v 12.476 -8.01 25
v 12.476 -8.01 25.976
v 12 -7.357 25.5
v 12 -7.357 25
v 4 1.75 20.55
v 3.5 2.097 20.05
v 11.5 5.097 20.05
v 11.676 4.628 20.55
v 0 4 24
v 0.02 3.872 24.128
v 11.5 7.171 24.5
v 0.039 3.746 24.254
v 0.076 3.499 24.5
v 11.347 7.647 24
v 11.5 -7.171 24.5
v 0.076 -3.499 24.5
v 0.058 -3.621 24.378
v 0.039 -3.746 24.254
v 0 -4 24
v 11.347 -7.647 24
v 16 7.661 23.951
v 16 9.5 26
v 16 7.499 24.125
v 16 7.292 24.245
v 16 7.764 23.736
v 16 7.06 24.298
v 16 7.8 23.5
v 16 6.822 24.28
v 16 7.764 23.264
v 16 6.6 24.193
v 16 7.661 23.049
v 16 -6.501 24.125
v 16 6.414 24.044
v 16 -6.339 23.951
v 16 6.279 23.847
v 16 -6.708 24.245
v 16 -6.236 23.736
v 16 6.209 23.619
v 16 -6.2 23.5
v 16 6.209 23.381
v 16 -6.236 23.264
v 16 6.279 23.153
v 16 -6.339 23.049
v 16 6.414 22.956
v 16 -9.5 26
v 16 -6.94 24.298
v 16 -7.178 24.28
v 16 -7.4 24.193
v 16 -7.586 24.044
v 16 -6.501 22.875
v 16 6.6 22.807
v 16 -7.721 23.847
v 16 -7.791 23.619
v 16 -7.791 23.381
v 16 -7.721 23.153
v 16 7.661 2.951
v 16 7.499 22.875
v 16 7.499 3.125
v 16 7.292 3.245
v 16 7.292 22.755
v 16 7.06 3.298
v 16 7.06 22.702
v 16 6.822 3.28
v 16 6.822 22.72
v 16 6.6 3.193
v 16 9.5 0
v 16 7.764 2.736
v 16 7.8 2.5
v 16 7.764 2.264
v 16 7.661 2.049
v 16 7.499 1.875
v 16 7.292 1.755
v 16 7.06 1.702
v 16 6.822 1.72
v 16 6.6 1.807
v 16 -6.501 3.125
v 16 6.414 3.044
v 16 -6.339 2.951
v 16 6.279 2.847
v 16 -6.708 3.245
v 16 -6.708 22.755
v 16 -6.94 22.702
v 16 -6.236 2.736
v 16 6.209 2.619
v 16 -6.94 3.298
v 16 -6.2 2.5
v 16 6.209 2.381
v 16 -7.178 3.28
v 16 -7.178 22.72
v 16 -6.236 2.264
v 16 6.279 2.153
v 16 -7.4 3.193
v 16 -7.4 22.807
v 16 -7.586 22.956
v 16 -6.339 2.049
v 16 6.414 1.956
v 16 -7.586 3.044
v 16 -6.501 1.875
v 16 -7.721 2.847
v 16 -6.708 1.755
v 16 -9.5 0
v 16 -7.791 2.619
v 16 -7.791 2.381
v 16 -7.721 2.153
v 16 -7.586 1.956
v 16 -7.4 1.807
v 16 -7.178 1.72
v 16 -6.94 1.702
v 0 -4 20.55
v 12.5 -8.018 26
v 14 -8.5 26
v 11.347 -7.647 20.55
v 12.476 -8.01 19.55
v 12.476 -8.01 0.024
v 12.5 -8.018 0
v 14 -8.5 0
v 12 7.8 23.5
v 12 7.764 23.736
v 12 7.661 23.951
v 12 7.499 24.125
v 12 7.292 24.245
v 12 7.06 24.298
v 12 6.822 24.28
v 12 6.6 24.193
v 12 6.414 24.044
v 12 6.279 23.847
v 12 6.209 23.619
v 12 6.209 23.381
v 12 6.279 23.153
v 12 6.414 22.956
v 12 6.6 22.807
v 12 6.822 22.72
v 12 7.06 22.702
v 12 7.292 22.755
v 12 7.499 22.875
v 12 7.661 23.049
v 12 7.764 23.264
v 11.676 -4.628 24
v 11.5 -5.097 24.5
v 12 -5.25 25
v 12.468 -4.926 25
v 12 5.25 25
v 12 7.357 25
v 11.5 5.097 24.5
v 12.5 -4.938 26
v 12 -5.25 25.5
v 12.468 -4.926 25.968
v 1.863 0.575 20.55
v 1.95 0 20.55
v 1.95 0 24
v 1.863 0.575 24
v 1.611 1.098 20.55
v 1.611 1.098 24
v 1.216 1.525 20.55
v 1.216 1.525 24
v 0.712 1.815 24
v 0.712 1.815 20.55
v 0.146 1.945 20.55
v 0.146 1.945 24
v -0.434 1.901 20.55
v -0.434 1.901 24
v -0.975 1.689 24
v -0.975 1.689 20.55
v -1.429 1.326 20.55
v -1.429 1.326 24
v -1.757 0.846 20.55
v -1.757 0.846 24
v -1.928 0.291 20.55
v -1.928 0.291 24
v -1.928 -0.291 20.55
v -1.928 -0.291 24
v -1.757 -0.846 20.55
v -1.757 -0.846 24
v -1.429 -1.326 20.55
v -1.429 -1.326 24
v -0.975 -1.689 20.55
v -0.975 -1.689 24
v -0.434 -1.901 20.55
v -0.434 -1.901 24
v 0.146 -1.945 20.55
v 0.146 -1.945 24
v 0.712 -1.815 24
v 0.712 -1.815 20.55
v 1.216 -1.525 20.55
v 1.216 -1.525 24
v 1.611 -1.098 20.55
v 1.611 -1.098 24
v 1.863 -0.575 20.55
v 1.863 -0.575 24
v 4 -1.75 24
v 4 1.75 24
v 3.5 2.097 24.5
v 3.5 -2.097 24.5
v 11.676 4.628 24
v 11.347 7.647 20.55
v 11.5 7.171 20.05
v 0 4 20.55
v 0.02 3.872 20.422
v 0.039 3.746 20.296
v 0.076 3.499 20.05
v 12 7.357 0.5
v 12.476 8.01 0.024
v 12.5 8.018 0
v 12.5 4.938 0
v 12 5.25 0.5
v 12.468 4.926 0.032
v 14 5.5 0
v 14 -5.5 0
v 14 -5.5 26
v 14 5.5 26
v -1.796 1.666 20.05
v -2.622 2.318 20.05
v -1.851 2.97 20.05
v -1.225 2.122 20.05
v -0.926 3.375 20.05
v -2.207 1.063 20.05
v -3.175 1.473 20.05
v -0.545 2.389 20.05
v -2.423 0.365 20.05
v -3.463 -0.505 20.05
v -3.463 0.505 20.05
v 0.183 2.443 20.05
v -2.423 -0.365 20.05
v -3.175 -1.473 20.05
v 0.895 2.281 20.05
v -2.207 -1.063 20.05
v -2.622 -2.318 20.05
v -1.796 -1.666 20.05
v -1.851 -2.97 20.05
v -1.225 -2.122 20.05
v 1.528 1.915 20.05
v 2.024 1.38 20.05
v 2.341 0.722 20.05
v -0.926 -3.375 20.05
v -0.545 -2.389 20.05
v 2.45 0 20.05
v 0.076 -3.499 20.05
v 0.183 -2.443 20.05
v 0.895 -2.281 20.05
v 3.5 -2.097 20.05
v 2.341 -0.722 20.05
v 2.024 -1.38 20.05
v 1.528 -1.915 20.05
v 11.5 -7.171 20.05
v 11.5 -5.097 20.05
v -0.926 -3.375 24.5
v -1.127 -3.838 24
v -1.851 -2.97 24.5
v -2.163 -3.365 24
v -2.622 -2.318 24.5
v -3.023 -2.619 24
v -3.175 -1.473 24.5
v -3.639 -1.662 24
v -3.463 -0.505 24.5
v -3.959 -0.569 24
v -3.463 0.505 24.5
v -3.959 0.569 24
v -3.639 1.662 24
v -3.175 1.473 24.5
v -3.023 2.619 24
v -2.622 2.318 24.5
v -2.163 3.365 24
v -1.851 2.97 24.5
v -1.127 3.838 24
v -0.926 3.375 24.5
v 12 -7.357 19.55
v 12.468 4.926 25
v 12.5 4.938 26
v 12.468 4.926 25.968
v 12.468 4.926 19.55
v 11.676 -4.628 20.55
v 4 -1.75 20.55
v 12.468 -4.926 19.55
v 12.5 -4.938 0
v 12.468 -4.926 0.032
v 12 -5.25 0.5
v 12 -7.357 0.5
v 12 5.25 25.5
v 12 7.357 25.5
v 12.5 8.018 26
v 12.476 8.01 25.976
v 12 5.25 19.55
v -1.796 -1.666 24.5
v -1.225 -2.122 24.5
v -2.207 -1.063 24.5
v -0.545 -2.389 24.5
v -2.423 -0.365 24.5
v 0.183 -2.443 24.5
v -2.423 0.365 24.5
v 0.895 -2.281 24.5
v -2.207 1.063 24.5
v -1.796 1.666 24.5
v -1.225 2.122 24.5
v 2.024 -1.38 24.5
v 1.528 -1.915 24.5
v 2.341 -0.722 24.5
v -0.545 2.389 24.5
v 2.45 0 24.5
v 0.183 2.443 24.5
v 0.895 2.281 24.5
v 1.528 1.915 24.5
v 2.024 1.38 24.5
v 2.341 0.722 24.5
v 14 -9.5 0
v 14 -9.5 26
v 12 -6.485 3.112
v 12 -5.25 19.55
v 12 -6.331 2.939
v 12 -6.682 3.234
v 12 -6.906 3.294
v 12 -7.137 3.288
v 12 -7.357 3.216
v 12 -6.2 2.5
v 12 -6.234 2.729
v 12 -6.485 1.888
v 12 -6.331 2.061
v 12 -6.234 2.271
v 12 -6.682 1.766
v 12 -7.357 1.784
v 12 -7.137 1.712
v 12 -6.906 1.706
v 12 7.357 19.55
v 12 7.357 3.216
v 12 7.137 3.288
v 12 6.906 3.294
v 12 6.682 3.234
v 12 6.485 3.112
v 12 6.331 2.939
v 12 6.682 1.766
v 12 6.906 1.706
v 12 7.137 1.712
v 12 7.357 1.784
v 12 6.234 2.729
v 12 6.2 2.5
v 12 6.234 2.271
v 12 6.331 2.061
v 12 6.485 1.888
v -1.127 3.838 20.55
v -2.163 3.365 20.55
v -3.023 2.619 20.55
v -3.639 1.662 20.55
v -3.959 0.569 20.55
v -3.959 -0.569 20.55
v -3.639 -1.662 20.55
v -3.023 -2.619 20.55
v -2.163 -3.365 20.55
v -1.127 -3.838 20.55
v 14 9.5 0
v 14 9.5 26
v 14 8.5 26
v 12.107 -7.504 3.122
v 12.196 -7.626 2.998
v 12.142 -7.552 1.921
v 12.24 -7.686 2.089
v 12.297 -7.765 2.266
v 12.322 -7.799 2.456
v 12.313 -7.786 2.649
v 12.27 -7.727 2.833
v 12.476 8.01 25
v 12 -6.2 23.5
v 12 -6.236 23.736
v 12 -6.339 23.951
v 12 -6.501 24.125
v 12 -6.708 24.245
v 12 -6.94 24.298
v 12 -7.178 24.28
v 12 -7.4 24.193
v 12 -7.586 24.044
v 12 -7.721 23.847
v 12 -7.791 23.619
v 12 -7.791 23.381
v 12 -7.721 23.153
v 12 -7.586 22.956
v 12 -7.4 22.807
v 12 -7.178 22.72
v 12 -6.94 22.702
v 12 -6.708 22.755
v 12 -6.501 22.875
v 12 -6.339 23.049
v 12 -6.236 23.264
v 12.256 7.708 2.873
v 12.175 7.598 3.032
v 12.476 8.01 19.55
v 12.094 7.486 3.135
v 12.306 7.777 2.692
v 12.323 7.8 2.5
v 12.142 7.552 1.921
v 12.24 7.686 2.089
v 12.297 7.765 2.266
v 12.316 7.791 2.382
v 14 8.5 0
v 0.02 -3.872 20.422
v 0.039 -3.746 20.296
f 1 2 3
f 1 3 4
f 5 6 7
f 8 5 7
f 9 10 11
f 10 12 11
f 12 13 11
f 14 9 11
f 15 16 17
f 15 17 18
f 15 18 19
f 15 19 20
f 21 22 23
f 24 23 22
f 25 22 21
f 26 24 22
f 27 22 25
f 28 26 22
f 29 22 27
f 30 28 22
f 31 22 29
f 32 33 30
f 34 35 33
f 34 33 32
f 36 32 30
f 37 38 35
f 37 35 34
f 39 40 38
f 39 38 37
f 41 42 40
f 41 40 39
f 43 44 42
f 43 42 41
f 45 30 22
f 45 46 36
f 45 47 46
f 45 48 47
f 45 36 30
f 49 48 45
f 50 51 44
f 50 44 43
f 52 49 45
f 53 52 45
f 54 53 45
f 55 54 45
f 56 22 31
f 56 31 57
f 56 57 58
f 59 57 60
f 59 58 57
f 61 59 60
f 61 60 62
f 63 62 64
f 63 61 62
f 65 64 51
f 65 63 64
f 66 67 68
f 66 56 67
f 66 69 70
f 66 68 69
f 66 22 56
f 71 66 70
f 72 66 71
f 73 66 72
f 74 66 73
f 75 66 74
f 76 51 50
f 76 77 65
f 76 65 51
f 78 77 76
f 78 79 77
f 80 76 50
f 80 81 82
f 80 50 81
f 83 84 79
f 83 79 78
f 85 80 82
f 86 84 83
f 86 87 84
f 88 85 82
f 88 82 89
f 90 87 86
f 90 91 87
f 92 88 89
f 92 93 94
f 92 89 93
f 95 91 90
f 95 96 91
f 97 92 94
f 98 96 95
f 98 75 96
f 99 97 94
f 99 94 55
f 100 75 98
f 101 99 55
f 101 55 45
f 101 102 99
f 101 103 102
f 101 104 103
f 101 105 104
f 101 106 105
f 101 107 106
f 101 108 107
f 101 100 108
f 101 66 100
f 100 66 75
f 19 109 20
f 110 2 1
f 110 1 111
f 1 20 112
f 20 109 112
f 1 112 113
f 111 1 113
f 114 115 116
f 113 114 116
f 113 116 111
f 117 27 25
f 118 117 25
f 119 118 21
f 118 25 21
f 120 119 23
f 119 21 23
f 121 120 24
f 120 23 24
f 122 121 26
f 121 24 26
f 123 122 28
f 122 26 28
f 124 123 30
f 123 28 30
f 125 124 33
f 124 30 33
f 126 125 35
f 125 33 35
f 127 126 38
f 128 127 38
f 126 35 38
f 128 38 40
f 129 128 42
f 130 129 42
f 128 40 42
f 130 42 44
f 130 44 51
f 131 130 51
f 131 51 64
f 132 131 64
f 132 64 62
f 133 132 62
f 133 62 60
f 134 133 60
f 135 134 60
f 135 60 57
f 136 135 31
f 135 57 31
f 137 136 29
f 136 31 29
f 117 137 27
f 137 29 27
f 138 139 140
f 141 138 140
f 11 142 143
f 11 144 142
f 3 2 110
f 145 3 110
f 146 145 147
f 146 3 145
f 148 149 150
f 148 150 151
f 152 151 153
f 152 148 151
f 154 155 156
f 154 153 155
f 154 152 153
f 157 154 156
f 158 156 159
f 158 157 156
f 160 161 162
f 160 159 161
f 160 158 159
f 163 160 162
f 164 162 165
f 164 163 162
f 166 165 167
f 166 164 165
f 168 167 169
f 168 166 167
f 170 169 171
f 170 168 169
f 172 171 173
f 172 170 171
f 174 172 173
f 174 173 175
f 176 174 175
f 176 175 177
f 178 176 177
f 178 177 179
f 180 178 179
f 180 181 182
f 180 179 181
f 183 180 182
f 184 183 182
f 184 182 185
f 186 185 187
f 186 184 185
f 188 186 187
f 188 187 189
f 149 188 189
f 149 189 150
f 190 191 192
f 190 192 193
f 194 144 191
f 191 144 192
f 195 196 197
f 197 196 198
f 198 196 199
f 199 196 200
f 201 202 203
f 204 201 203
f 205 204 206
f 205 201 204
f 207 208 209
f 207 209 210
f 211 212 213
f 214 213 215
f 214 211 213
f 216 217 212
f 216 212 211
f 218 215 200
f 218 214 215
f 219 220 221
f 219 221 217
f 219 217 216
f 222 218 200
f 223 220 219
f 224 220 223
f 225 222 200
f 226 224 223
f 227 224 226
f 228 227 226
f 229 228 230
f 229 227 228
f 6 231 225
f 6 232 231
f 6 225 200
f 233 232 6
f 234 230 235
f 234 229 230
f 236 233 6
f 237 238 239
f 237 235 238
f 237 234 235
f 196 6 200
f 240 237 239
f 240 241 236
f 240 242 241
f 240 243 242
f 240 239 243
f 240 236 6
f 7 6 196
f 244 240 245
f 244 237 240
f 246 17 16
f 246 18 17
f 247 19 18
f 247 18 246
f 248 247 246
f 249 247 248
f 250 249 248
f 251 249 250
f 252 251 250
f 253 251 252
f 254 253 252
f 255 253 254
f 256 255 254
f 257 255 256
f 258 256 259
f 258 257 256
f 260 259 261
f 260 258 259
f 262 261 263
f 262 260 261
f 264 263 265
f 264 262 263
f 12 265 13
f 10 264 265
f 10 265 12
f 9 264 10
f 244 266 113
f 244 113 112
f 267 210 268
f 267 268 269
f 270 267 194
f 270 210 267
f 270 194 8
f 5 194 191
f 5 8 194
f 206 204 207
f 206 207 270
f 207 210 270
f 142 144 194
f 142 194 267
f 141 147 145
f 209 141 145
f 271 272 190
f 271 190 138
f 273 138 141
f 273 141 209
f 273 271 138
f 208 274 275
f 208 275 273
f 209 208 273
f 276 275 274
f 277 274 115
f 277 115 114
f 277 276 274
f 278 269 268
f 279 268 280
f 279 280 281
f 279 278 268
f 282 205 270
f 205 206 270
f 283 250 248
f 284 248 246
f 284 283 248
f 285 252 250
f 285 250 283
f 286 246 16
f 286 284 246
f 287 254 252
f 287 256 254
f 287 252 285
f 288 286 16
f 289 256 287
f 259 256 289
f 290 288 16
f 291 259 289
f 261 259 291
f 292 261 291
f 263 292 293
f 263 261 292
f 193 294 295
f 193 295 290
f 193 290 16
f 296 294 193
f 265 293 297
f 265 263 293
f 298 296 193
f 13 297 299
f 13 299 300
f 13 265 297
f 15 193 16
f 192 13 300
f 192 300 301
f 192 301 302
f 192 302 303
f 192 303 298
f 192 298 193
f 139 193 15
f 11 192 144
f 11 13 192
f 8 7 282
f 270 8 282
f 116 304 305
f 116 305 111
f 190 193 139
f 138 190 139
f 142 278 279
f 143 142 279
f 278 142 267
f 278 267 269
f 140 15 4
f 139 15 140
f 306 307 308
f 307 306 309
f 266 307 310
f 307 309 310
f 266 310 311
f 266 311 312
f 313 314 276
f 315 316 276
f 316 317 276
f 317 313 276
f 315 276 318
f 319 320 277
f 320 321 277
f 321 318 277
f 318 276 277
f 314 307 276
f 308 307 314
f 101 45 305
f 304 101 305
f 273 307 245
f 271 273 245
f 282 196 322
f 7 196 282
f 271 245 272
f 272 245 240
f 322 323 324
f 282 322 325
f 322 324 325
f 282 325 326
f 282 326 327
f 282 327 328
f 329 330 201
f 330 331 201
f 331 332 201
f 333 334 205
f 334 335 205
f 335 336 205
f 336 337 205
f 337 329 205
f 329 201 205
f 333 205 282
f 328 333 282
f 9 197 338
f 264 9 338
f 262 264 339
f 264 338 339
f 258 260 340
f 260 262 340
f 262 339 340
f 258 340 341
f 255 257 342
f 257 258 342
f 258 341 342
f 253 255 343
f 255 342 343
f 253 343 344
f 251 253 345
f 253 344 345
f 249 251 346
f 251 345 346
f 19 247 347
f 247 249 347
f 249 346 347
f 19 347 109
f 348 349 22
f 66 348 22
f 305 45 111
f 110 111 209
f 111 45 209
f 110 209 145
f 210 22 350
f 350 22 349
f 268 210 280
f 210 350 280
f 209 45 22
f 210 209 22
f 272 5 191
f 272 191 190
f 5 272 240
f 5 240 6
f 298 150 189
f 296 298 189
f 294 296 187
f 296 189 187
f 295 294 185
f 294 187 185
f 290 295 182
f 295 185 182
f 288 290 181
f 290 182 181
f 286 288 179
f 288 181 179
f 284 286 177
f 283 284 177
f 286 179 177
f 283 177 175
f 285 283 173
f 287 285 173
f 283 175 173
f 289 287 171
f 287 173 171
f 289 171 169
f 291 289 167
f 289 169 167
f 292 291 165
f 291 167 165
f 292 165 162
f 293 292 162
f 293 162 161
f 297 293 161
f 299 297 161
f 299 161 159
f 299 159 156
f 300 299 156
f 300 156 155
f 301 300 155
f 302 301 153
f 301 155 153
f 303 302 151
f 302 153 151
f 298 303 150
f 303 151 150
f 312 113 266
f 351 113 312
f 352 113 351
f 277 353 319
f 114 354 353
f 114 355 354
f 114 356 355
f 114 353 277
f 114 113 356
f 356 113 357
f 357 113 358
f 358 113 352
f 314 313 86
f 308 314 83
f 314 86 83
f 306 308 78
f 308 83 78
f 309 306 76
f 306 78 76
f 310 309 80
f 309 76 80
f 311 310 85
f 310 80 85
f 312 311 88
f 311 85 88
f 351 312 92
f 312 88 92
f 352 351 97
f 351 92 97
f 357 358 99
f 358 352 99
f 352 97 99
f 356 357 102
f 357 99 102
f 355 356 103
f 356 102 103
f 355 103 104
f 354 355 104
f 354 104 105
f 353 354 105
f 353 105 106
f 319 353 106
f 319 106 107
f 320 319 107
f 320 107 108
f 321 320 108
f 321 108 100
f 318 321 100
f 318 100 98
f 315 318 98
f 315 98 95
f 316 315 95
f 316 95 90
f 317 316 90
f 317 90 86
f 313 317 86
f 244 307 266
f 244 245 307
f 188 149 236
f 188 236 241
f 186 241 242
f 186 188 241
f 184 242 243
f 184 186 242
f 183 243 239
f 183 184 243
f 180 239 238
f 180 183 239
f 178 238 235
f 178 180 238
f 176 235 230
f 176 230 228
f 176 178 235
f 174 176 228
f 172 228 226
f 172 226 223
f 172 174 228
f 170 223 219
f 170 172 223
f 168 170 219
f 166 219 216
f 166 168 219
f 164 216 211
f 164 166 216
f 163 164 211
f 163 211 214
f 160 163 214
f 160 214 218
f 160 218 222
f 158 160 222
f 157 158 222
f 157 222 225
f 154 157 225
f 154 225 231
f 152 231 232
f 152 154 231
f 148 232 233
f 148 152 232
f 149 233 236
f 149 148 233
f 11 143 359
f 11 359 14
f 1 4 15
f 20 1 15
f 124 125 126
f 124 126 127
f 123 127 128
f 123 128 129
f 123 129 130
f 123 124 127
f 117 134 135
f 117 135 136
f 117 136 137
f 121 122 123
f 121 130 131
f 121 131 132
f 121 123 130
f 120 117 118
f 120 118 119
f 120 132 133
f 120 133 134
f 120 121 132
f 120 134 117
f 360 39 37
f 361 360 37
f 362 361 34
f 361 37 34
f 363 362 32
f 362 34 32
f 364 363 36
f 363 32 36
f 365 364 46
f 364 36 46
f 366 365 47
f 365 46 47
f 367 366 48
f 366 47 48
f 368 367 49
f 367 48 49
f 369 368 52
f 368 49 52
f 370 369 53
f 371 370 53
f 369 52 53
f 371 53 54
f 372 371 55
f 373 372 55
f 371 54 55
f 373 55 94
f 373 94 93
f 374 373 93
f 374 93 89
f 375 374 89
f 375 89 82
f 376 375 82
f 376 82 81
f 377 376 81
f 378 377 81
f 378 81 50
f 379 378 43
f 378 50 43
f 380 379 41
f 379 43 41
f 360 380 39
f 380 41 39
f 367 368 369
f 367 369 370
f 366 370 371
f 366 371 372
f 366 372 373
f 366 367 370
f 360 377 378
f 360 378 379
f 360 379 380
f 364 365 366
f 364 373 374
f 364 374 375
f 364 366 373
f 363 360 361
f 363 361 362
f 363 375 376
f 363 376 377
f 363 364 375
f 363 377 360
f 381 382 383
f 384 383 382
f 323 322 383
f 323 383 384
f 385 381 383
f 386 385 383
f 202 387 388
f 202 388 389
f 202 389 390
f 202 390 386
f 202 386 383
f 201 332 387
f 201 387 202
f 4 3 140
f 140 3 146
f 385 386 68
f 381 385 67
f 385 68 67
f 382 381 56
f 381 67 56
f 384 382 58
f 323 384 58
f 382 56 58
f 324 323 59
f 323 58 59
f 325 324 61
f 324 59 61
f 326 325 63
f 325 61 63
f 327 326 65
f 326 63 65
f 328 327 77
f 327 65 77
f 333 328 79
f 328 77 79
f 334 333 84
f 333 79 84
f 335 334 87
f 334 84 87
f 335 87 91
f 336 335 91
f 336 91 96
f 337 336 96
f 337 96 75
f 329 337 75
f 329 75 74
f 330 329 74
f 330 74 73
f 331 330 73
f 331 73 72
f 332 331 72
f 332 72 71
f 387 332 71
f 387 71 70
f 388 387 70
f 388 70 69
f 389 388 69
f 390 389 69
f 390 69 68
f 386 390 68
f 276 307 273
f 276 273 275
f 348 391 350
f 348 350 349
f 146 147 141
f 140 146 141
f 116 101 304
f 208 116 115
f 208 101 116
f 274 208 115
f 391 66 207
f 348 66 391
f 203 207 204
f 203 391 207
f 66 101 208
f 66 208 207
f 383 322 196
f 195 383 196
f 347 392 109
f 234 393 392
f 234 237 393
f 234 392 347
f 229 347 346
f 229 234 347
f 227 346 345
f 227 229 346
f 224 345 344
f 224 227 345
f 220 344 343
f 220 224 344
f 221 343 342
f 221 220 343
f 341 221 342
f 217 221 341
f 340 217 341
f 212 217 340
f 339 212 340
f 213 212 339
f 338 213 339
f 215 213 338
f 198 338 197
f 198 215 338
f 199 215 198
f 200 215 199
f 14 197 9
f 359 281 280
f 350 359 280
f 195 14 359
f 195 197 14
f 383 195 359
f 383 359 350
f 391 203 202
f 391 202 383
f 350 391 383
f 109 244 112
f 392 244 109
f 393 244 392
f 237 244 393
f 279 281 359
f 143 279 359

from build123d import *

# Parameters (mm, degrees)
SKETCH_R        = 1.95
PAD_DEPTH       = 26
SKETCH002_W     = 18
SKETCH002_H     = 22
POCKET_DEPTH    = 20.05
SKETCH003_W     = 18.7
SKETCH003_H     = 19.57
POCKET001_DEPTH = 1.5
CHAMFER_SIZE    = 0.5
SKETCH004_R     = 0.8
POCKET002_DEPTH = 4


with BuildPart() as part:
    # Sketch → Pad (new body)
    with BuildSketch(Plane.XY):
        with BuildLine():
            Line((14, 9.5), (16, 9.5))
            Line((16, 9.5), (16, -9.5))
            Line((16, -9.5), (14, -9.5))
            Line((14, -9.5), (14, -8.5))
            Line((0, -4), (14, -8.5))
            ThreePointArc((0, 4), (-4, 0), (0, -4))
            Line((0, 4), (14, 8.5))
            Line((14, 8.5), (14, 9.5))
        make_face()
        Circle(SKETCH_R, mode=Mode.SUBTRACT)
        Polygon((4, 1.75), (4, -1.75), (14, -5.5), (14, 5.5), align=None, mode=Mode.SUBTRACT)
    extrude(amount=PAD_DEPTH)

    # Sketch002 (on Face14 of Pad) → Pocket (cut)
    with BuildSketch(Plane(origin=(0, 0, 0), x_dir=(1, 0, 0), z_dir=(0, 0, -1))):
        with Locations((3, 0)):
            Rectangle(SKETCH002_W, SKETCH002_H)
    extrude(amount=-POCKET_DEPTH, mode=Mode.SUBTRACT)

    # Sketch003 (on Face6 of Pocket) → Pocket001 (cut)
    with BuildSketch(Plane.XY.offset(26)):
        with Locations((2.65, 0.635)):
            Rectangle(SKETCH003_W, SKETCH003_H)
    extrude(amount=-POCKET001_DEPTH, mode=Mode.SUBTRACT)

    # Chamfer
    chamfer_edges = [part.edges().sort_by_distance(p)[0] for p in [
        (6, -5.928571, 20.05),
        (-4, 0, 20.05),
        (6, 5.928571, 20.05),
        (12, 6.303571, 20.05),
        (8, 3.25, 20.05),
        (4, 0, 20.05),
        (8, -3.25, 20.05),
        (12, -6.303571, 20.05),
        (-1.95, 0, 20.05),
        (12, 6.303571, 26),
        (12, 4.75, 25.25),
        (12, 6.303571, 24.5),
        (12, 7.857143, 25.25),
        (6, 5.928571, 24.5),
        (-4, 0, 24.5),
        (6, -5.928571, 24.5),
        (12, -6.303571, 24.5),
        (8, -3.25, 24.5),
        (4, 0, 24.5),
        (8, 3.25, 24.5),
        (-1.95, 0, 24.5),
        (12, -6.303571, 26),
        (12, -7.857143, 25.25),
        (12, -4.75, 25.25),
        (12, 6.303571, 0),
        (12, 7.857143, 10.025),
        (12, 4.75, 10.025),
        (12, -6.303571, 0),
        (12, -4.75, 10.025),
        (12, -7.857143, 10.025),
    ]]
    chamfer(chamfer_edges, length=CHAMFER_SIZE)

    # Sketch004 (on Face20 of Chamfer) → Pocket002 (cut)
    with BuildSketch(Plane.YZ.offset(16)):
        with Locations((7, 23.5)):
            Circle(SKETCH004_R)
        with Locations((7, 2.5)):
            Circle(SKETCH004_R)
        with Locations((-7, 2.5)):
            Circle(SKETCH004_R)
        with Locations((-7, 23.5)):
            Circle(SKETCH004_R)
    extrude(amount=-POCKET002_DEPTH, mode=Mode.SUBTRACT)


solid = part.part
